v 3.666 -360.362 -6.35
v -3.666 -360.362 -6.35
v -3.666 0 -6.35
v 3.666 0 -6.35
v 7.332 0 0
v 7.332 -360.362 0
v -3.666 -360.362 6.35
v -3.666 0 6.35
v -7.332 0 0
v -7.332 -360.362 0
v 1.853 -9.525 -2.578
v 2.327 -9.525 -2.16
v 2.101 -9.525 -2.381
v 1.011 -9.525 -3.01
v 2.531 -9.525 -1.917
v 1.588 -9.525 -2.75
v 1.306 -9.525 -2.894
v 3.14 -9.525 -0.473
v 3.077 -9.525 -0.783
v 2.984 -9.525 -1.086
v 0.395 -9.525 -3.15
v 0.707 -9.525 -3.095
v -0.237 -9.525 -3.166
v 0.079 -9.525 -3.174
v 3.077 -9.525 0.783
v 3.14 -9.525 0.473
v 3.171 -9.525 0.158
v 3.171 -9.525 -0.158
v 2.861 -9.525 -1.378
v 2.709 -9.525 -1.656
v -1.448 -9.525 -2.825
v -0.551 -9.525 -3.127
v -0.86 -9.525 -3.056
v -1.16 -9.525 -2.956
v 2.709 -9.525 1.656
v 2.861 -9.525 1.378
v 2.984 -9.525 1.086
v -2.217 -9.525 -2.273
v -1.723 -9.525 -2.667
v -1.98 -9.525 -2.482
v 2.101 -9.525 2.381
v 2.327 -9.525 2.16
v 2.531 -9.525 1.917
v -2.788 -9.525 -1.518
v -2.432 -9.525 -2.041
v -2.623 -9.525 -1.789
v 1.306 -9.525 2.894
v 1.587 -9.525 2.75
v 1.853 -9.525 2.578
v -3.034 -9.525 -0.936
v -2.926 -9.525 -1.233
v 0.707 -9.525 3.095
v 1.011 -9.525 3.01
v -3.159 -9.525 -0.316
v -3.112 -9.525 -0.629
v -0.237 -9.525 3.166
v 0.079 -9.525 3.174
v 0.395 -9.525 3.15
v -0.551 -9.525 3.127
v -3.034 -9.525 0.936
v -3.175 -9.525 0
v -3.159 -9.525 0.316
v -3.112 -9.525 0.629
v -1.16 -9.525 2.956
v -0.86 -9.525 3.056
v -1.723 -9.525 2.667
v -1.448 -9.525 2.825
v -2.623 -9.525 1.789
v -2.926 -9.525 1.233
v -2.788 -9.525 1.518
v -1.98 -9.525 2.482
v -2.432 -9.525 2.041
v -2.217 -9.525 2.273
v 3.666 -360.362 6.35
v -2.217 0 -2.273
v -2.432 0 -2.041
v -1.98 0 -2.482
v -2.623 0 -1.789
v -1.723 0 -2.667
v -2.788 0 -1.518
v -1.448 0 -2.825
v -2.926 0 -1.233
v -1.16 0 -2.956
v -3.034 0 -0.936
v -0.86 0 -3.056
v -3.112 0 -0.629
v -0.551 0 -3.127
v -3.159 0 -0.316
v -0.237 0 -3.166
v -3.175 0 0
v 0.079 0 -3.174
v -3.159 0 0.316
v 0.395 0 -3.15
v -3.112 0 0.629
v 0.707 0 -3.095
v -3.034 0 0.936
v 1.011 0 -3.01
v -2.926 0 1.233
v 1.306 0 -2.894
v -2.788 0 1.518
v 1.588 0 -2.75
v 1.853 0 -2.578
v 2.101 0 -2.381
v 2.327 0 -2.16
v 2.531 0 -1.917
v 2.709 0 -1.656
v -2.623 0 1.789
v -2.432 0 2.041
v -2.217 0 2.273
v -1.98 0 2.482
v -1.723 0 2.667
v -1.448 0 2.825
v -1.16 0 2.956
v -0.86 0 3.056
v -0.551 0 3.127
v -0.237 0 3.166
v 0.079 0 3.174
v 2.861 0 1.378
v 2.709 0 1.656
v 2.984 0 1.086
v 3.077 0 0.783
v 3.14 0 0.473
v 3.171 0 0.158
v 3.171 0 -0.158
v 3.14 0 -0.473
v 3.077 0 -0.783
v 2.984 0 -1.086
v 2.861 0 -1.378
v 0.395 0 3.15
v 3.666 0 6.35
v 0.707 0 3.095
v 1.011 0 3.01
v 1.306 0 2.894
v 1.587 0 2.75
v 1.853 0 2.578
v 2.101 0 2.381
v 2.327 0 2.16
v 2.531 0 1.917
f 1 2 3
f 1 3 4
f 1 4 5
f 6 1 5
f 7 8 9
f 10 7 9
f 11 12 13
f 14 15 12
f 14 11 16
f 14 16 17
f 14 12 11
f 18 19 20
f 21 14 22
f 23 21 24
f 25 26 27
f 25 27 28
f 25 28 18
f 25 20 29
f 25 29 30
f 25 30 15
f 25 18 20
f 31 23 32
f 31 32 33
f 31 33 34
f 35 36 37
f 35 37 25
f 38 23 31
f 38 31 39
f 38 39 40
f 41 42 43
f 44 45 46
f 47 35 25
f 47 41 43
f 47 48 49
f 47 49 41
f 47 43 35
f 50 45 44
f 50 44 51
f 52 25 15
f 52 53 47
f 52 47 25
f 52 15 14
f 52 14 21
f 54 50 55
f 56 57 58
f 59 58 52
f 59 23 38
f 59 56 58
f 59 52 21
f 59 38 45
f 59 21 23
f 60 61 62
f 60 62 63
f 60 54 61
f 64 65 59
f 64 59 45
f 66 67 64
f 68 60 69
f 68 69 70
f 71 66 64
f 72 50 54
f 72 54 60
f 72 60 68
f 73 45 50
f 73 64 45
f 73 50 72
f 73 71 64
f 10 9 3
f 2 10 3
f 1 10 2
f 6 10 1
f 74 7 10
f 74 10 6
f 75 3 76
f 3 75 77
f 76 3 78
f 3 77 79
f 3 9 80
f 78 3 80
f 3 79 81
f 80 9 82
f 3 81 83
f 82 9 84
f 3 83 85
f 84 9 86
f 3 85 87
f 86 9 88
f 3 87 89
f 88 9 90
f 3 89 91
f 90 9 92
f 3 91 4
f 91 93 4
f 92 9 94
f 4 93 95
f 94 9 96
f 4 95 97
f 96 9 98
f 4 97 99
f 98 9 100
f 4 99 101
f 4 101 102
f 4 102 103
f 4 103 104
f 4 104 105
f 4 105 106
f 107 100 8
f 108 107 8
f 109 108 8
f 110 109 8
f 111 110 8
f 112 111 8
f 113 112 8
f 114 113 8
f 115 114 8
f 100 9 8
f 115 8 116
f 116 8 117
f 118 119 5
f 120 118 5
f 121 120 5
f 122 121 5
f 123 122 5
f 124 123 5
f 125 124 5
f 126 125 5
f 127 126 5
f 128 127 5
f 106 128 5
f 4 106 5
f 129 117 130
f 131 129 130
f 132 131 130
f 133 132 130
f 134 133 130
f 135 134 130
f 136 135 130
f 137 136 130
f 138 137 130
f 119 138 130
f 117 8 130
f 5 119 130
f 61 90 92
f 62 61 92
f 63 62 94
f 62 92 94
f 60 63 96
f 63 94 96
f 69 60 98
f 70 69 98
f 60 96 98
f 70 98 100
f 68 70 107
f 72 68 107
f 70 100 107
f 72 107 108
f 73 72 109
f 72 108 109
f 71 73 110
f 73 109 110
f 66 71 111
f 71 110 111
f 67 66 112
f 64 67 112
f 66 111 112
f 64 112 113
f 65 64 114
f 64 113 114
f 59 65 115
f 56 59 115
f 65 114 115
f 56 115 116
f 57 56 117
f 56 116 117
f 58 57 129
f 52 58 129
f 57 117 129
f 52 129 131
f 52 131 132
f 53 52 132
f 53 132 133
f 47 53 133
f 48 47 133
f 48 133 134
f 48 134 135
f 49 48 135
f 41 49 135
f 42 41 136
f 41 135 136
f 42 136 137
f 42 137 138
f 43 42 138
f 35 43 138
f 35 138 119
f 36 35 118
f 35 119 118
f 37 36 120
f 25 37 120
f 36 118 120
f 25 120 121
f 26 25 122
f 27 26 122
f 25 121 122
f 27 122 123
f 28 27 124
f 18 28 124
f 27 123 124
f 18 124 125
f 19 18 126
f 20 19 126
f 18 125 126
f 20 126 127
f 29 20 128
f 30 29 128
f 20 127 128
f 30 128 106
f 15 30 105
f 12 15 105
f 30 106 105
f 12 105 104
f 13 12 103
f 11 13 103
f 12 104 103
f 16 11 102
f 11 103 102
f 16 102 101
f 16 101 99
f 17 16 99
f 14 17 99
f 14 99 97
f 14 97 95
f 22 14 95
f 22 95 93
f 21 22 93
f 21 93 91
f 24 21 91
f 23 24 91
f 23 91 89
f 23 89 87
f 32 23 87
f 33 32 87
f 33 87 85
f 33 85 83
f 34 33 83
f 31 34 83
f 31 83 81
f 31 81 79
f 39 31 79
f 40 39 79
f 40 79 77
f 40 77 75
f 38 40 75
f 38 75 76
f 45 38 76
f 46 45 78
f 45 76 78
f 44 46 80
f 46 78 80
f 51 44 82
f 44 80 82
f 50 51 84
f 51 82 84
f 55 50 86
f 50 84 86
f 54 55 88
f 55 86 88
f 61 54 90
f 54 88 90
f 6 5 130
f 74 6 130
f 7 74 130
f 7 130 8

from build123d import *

# Parameters (mm, degrees)
F1_DEPTH = 360.3625
F2_R     = 3.175
F3_DEPTH = 9.525


with BuildPart() as f1:
    # F0 (on Front) → F1 (new body)
    with BuildSketch(Plane.XZ):
        Polygon((3.666174, 6.35), (-3.666174, 6.35), (-7.332348, 0), (-3.666174, -6.35), (3.666174, -6.35), (7.332348, 0), align=None)
    extrude(amount=F1_DEPTH)

    # F2 (on face) → F3 (cut)
    with BuildSketch(Plane(origin=(0, 0, 0), x_dir=(-1, 0, 0), z_dir=(0, 1, 0))):
        Circle(F2_R)
    extrude(amount=-F3_DEPTH, mode=Mode.SUBTRACT)


solid = f1.part
